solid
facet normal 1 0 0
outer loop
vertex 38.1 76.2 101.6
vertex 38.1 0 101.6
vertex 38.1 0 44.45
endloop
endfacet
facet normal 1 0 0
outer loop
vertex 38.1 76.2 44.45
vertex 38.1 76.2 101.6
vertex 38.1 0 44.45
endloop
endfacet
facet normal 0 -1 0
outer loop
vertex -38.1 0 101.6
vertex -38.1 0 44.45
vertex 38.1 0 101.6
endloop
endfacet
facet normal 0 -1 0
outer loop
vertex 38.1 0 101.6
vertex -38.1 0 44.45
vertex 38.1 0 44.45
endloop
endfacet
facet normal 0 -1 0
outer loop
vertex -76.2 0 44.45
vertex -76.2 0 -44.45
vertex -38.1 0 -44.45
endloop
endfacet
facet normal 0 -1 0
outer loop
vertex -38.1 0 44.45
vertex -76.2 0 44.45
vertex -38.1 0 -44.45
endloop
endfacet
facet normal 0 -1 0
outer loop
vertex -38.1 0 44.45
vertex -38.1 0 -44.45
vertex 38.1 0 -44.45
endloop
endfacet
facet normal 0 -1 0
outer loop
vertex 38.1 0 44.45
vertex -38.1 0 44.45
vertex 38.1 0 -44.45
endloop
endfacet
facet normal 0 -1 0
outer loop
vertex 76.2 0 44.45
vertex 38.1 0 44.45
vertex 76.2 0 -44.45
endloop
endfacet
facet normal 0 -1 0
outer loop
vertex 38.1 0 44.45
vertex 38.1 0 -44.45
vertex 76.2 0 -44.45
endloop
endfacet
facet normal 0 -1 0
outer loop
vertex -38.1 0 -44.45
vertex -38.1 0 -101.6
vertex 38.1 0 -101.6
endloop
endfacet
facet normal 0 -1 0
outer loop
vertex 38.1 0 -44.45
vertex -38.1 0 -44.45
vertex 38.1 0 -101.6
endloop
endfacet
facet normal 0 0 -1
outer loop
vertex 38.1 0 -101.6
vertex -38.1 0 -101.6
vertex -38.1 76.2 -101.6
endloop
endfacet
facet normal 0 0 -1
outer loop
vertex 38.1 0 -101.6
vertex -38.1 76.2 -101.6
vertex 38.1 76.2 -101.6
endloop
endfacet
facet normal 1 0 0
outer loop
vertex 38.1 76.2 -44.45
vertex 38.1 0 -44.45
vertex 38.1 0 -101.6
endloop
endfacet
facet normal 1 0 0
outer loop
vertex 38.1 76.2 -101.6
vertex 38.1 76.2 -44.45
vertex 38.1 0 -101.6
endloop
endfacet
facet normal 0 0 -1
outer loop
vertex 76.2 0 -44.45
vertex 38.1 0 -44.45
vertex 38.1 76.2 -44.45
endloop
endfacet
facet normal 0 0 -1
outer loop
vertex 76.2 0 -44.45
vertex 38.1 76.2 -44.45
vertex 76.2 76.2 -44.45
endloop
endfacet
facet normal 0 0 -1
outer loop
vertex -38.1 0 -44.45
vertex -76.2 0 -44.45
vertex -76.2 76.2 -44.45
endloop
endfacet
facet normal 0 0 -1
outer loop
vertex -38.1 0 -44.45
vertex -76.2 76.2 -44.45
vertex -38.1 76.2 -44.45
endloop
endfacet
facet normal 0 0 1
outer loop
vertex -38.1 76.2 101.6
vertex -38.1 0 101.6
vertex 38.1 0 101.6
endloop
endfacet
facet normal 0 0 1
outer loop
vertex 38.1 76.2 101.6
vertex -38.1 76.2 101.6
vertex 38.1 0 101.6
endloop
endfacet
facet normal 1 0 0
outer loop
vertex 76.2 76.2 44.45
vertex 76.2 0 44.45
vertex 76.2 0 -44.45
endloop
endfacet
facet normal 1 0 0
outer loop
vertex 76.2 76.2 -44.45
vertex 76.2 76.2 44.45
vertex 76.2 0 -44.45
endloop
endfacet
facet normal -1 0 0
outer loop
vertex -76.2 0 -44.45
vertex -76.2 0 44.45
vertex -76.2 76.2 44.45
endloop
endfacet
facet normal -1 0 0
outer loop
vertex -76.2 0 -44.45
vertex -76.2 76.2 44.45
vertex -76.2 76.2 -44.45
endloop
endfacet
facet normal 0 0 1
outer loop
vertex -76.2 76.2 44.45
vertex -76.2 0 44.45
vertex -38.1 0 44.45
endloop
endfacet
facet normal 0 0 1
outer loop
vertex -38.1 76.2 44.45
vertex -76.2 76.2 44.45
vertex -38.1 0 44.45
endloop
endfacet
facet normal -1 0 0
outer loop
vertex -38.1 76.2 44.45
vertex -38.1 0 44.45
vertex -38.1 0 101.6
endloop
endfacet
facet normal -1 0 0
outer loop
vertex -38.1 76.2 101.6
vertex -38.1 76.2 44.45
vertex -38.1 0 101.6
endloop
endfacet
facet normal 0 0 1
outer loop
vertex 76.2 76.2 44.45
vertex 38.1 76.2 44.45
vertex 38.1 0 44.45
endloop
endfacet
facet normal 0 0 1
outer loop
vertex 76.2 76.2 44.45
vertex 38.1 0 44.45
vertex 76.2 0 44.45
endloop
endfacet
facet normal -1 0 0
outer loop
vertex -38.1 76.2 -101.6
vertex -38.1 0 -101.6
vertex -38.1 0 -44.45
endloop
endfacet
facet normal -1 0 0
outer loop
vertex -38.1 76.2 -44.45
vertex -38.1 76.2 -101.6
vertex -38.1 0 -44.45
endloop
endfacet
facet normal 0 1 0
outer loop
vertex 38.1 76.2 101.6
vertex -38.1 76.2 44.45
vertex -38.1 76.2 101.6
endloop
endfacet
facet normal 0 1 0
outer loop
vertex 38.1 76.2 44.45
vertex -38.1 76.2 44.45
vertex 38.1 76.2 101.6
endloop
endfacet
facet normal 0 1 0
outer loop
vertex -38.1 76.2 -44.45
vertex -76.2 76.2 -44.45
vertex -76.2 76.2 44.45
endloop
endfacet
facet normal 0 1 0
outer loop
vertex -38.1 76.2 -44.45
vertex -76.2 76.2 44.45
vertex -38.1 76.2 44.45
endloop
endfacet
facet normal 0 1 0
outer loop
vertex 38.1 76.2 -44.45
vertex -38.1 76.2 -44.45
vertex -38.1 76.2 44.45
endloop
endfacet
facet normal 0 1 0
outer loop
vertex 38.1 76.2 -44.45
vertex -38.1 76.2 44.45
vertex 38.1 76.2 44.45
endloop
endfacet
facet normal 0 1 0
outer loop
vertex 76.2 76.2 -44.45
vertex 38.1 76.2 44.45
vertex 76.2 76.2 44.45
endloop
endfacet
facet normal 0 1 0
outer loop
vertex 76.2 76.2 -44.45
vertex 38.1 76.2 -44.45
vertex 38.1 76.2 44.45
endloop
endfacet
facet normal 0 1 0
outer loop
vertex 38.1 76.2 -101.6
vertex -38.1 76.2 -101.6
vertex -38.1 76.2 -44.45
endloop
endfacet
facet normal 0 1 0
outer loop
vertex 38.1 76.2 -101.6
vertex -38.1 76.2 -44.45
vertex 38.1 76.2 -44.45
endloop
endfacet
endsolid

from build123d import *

# Parameters (mm, degrees)
SKETCH1_W           = 76.2
SKETCH1_H           = 88.9
SKETCH1_H_2         = 57.15
SKETCH1_W_2         = 38.1
BOSS_EXTRUDE1_DEPTH = 76.2


with BuildPart() as part:
    # Sketch1 → Boss-Extrude1 (new body)
    with BuildSketch(Plane(origin=(0, 0, 0), x_dir=(1, 0, 0), z_dir=(0, 1, 0))):
        Rectangle(SKETCH1_W, SKETCH1_H)
        with Locations((0, 73.025)):
            Rectangle(SKETCH1_W, SKETCH1_H_2)
        with Locations((57.15, 0)):
            Rectangle(SKETCH1_W_2, SKETCH1_H)
        with Locations((0, -73.025)):
            Rectangle(SKETCH1_W, SKETCH1_H_2)
        with Locations((-57.15, 0)):
            Rectangle(SKETCH1_W_2, SKETCH1_H)
    extrude(amount=BOSS_EXTRUDE1_DEPTH)


solid = part.part
